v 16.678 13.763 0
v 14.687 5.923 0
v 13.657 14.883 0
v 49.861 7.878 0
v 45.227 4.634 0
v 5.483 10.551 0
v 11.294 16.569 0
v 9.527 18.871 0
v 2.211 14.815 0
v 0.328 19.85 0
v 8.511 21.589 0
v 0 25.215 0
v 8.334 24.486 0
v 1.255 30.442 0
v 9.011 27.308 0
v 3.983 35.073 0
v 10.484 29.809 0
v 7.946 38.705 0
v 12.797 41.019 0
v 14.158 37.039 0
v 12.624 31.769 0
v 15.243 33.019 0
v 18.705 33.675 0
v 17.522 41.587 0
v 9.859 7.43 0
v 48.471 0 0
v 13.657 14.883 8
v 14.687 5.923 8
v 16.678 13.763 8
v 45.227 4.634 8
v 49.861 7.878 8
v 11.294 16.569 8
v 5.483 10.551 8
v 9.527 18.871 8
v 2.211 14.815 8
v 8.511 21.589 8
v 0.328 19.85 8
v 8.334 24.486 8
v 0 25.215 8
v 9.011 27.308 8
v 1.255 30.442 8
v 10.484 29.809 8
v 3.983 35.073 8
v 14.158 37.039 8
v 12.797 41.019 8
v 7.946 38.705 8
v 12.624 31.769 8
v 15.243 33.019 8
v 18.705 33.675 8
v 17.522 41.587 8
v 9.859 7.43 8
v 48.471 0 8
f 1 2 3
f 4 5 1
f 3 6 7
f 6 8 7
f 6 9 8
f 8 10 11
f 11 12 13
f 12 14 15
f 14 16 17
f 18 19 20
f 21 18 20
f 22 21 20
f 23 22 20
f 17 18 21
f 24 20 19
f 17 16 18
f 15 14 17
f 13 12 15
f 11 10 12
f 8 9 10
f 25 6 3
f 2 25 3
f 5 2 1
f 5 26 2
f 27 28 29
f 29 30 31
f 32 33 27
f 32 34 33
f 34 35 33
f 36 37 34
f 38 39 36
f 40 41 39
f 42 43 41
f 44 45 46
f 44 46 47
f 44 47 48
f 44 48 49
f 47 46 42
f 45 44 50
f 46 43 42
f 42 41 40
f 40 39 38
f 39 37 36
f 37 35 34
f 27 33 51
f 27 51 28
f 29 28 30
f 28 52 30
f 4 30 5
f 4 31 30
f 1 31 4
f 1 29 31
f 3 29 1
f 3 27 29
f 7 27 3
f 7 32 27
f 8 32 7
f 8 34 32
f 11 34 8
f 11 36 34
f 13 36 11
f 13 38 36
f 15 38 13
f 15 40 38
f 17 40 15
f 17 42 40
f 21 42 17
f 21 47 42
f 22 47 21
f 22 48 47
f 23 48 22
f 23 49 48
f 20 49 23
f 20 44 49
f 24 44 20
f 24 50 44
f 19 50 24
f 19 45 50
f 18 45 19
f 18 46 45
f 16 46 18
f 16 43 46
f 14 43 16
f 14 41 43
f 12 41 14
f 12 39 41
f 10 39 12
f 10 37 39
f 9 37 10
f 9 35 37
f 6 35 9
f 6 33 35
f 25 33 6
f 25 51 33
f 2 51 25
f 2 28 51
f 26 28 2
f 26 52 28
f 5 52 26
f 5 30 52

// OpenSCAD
$fn = 32;

// ----------------------------------------------------------------------
// Hook plate: curl radius 14 mm over 170 degrees, 8 mm thick band
// ----------------------------------------------------------------------

// --- parameters (mm) ---
profile_height = 8;       // extrusion height
profile_points = 26;      // points of the closed outline

profile = [[14.158, 37.039], [17.522, 41.587], [12.797, 41.019], [7.946, 38.705], [3.983, 35.073], [1.255, 30.442], [0, 25.215], [0.328, 19.85], [2.211, 14.815], [5.483, 10.551], [9.859, 7.43], [14.687, 5.923], [48.471, 0], [45.227, 4.634], [49.861, 7.878], [16.678, 13.763], [13.657, 14.883], [11.294, 16.569], [9.527, 18.871], [8.511, 21.589], [8.334, 24.486], [9.011, 27.308], [10.484, 29.809], [12.624, 31.769], [15.243, 33.019], [18.705, 33.675]];  // single closed polygon, 26 points, counter clockwise

// --- the one profile operation ---
linear_extrude(height = profile_height) polygon(points = profile);
